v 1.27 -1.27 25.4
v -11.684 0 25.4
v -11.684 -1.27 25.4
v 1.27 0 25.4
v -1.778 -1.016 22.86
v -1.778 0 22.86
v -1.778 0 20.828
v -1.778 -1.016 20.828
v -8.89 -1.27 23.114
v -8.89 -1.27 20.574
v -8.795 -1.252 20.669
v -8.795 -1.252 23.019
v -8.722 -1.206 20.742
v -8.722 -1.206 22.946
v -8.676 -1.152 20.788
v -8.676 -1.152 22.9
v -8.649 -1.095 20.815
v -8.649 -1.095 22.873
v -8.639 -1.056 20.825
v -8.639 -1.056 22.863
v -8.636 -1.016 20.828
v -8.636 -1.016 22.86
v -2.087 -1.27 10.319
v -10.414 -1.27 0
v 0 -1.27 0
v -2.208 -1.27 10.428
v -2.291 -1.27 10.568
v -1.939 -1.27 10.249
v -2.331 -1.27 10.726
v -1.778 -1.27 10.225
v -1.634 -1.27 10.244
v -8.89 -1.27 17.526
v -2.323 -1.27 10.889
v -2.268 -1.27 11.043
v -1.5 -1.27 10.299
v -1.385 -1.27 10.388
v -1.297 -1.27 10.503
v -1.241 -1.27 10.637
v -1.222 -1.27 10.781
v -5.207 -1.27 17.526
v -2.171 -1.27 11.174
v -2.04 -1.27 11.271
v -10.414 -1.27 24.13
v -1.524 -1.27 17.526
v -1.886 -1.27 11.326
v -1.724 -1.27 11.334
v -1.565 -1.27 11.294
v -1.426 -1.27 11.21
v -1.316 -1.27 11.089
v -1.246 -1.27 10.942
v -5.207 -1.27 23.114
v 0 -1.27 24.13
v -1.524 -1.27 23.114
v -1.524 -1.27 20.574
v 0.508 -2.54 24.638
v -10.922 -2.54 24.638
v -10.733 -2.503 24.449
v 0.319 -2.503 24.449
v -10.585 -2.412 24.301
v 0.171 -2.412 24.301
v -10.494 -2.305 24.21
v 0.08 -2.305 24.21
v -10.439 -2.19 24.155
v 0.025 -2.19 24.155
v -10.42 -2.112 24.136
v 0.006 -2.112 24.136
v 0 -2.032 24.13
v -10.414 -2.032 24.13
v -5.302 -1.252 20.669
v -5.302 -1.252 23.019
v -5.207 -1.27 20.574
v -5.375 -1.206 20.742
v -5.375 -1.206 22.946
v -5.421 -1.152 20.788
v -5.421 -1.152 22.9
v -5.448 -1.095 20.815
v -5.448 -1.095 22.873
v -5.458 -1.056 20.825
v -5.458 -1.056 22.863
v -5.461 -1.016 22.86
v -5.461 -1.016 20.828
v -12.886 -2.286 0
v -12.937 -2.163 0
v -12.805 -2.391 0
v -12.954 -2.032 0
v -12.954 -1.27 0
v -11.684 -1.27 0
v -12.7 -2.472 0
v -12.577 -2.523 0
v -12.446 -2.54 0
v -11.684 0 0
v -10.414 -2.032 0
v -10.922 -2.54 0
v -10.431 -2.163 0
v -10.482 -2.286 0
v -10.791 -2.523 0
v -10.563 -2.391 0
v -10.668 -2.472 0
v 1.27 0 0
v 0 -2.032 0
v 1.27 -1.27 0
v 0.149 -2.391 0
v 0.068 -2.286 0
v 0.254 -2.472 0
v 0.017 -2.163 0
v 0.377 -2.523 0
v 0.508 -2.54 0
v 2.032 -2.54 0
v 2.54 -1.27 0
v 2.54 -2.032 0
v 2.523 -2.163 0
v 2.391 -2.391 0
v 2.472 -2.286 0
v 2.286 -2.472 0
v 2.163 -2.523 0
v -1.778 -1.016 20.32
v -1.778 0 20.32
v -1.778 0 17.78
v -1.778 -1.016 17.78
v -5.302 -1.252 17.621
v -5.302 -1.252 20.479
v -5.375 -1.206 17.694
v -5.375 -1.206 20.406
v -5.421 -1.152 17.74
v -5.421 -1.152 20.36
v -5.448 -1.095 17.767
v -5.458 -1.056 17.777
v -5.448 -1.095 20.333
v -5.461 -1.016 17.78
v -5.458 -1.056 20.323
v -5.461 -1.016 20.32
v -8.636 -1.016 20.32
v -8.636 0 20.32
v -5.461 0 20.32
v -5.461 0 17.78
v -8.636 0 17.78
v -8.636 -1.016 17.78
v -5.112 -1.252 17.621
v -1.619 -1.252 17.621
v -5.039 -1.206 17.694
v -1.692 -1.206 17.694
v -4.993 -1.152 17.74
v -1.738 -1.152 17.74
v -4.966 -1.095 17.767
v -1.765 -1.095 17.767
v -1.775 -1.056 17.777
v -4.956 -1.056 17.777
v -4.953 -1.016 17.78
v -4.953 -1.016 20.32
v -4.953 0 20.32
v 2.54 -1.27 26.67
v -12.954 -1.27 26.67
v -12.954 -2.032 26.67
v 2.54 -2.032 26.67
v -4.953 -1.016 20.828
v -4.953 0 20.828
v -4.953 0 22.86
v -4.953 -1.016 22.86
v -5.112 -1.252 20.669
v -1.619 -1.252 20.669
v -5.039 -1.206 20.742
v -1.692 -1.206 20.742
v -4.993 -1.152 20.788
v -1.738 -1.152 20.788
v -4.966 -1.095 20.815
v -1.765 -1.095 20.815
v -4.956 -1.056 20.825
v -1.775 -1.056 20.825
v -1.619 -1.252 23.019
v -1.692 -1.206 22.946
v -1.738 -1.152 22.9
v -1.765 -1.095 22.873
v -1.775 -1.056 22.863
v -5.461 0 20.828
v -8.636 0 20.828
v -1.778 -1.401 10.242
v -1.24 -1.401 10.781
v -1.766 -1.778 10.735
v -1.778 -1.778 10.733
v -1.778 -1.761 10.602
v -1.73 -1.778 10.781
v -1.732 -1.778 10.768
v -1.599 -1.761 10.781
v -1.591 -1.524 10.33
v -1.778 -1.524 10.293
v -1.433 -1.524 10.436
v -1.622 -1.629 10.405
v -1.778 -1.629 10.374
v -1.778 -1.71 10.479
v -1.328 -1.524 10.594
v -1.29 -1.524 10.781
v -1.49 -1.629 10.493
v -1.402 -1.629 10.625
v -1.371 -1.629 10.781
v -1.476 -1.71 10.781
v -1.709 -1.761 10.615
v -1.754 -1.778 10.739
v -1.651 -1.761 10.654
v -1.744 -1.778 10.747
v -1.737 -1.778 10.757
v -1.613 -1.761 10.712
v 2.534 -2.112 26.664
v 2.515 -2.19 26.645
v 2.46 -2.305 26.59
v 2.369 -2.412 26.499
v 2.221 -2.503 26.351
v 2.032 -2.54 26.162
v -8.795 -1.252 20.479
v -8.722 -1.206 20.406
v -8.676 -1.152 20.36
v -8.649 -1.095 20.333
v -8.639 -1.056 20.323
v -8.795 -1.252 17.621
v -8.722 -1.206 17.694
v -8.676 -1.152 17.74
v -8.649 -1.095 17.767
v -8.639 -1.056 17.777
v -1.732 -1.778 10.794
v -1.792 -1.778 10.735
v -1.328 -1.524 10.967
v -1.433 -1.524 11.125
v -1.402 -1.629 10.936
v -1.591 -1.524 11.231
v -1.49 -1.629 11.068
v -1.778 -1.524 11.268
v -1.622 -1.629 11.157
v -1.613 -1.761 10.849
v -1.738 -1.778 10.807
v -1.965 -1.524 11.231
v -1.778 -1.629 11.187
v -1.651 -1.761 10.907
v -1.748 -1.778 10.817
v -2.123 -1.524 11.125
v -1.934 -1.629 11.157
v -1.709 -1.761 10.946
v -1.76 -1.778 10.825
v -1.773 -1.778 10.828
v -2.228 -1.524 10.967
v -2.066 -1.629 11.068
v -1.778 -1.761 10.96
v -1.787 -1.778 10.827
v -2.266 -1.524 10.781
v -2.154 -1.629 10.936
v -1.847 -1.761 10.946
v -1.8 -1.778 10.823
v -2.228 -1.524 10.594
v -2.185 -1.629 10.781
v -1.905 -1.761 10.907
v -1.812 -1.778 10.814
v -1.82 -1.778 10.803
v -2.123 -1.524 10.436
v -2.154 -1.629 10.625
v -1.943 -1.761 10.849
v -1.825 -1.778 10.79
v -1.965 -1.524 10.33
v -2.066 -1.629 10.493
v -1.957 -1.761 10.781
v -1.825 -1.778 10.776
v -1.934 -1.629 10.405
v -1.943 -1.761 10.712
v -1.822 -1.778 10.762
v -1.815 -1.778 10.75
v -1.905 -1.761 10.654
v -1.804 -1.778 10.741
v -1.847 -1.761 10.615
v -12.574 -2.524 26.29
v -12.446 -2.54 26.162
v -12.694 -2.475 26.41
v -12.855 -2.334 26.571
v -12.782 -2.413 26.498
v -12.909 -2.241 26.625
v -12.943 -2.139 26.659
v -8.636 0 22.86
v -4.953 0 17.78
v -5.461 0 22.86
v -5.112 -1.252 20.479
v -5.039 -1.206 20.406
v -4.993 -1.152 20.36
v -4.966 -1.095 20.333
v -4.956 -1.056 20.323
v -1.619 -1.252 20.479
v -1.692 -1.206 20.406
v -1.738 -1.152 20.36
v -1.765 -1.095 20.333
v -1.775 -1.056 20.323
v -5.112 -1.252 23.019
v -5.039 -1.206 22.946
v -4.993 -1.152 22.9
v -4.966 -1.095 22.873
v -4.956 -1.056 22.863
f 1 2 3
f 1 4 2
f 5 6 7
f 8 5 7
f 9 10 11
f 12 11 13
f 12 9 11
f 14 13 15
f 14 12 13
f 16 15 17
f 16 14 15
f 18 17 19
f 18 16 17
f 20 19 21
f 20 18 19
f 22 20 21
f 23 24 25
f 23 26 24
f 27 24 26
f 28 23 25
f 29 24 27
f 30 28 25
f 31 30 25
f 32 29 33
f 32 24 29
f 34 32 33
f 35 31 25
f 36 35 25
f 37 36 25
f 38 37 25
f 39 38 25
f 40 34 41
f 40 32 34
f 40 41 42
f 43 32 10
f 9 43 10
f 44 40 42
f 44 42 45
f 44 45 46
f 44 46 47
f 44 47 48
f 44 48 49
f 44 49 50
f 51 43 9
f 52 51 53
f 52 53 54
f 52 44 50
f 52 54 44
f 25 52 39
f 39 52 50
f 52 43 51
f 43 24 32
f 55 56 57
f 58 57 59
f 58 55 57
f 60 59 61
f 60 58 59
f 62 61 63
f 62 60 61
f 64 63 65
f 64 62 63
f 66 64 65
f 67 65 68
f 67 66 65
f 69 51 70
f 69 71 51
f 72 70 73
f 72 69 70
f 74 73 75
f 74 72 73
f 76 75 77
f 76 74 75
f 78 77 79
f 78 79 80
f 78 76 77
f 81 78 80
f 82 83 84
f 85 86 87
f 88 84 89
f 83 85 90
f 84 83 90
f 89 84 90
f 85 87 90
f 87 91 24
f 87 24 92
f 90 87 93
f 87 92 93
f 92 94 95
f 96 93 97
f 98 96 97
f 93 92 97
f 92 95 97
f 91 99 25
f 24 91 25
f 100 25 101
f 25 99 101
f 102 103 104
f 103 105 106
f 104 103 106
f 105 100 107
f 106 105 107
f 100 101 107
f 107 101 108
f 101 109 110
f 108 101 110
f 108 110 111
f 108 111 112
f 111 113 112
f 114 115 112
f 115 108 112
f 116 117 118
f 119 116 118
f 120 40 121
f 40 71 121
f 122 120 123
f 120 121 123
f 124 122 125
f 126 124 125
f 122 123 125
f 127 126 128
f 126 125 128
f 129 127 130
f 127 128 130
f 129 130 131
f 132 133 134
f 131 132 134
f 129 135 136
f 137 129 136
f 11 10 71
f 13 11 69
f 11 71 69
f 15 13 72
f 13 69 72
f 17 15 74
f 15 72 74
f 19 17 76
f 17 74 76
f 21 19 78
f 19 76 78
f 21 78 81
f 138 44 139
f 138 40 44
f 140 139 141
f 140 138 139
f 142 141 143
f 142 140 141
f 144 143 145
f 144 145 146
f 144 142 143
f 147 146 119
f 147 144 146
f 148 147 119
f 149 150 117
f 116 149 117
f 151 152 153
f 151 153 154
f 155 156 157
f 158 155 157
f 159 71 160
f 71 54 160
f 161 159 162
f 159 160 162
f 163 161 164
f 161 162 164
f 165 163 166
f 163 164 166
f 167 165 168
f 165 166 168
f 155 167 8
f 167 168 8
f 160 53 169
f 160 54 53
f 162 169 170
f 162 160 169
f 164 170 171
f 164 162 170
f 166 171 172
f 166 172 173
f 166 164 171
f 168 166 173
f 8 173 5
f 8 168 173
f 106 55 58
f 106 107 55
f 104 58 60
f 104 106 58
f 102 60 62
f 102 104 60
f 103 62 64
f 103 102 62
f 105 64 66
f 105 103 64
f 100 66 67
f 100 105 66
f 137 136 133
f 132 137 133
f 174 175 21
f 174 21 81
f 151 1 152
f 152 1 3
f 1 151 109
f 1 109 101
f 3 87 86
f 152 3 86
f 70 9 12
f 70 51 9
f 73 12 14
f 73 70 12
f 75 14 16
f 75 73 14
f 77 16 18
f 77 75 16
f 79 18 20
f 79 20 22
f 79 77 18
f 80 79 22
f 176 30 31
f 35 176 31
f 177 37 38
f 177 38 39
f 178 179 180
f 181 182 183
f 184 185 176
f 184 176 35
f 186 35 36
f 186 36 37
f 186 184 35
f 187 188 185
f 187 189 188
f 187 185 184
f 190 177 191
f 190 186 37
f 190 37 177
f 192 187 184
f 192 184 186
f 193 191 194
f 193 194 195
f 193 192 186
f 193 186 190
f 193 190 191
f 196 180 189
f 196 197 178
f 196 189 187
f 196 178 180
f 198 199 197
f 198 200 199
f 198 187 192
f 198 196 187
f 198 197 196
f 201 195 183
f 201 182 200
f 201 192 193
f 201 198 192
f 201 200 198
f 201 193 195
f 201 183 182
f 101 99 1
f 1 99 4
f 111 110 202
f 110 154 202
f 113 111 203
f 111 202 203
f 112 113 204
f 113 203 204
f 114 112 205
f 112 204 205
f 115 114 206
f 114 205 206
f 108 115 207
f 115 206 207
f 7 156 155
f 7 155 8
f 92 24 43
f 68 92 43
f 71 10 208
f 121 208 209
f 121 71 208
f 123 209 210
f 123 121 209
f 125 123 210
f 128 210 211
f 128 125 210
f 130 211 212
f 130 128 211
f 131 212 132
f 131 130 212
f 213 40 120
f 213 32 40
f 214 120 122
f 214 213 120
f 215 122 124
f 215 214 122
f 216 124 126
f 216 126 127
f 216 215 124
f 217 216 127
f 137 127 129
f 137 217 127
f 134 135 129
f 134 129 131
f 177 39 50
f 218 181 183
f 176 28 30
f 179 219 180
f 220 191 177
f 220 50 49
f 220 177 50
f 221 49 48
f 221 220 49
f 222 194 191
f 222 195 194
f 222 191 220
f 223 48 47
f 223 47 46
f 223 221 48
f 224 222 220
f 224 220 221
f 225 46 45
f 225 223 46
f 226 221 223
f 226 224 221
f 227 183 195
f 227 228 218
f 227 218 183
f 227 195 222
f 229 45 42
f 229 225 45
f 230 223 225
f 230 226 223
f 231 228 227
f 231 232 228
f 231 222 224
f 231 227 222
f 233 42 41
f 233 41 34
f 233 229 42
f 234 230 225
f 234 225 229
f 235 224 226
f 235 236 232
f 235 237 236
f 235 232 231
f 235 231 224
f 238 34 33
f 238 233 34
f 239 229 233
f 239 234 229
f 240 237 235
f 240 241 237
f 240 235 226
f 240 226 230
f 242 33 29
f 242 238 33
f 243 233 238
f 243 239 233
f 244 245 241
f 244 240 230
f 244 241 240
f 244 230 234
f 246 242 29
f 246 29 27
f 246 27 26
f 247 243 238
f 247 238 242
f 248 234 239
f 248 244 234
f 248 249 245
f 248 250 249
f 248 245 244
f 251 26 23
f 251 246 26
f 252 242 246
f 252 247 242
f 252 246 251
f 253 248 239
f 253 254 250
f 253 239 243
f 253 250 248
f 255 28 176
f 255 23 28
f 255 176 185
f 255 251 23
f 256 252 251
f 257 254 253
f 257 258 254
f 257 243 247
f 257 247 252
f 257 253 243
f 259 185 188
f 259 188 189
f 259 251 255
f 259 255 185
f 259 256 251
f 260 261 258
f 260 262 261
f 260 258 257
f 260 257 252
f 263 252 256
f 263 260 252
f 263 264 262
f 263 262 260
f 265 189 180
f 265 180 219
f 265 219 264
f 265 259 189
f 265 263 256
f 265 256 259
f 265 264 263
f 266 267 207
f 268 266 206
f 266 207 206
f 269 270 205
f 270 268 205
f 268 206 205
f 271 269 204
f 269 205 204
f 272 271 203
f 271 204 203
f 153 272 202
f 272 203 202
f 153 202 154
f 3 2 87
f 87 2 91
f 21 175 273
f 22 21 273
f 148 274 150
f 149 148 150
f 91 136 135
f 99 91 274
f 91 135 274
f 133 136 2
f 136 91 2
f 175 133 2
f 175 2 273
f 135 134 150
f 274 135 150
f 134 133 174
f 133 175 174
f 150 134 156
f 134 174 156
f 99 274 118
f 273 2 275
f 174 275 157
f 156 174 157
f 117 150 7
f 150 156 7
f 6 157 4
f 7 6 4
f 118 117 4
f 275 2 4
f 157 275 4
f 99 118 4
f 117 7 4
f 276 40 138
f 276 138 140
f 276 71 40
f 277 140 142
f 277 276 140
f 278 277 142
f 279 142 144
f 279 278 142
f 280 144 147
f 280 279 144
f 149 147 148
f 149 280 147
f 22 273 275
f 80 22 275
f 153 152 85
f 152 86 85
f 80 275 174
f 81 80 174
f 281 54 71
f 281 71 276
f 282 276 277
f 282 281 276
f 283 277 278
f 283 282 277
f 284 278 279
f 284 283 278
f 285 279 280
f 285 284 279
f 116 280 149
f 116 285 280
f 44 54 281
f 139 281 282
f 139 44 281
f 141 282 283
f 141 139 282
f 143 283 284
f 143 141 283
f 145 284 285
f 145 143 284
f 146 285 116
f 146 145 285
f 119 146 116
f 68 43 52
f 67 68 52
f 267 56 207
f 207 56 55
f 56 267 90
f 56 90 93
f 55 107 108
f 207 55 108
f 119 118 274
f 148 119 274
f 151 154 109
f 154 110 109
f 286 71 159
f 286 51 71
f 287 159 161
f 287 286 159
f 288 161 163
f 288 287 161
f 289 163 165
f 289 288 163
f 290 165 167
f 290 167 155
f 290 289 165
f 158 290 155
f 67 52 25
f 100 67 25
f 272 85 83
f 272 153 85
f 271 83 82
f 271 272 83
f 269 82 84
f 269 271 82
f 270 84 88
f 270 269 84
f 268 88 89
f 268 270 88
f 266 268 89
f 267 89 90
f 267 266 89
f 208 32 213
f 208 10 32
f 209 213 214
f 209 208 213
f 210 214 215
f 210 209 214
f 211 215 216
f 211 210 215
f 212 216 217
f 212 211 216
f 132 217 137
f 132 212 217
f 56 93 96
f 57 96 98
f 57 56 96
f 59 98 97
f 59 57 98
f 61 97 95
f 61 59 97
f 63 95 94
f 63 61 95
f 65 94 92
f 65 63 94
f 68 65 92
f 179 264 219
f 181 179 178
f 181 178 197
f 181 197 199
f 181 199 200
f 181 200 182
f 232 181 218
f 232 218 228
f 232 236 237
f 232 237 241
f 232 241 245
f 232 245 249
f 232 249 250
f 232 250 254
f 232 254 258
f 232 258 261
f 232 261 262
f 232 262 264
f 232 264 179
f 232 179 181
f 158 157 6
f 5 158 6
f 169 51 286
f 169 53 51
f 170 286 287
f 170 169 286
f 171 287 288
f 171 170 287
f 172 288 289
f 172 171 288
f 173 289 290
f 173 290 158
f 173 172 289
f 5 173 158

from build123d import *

# Parameters (mm, degrees)
F1_DEPTH  = 2.54
F0_W      = 0.508
F0_H      = 0.508
F0_H_2    = 2.032
F0_W_2    = 3.175
F0_H_3    = 2.54
F2_DEPTH  = 1.27
F3_DEPTH  = 1.778
F4_R      = 0.50799
F5_R      = 0.25399
F6_W      = 1.27
F6_H      = 25.4
F7_DEPTH  = 1.27
F8_W      = 1.27
F8_H      = 25.4
F9_DEPTH  = 1.27
F11_DEPTH = 1.27
F12_R     = 0.508


# Not quite as in the source:
# - a fillet or chamfer is up to 0.001 mm smaller than in the source, because OpenCascade refuses the exact size


with BuildPart() as f1:
    # F0 (on Front) → F1 (new body)
    with BuildSketch(Plane.XZ):
        Polygon((0, 24.13), (0, 0), (1.27, 0), (1.27, 25.4), (-11.684, 25.4), (-11.684, 0), (-10.414, 0), (-10.414, 24.13), align=None)
    extrude(amount=F1_DEPTH)

    # F0 (on Front) → F2 (join)
    with BuildSketch(Plane.XZ):
        Polygon((-1.778, 0), (0, 0), (0, 24.13), (-10.414, 24.13), (-10.414, 0), align=None)
        with BuildLine():
            ThreePointArc((-1.2223680419, 10.7806390151), (-1.3851088746, 10.3877478897), (-1.778, 10.2250070571))
            ThreePointArc((-1.778, 10.2250070571), (-2.1708911254, 11.1735301405), (-1.2223680419, 10.7806390151))
        make_face(mode=Mode.SUBTRACT)
        Polygon((-4.953, 22.86), (-1.778, 22.86), (-1.778, 20.828), (-1.778, 20.32), (-1.778, 17.78), (-4.953, 17.78), (-5.461, 17.78), (-8.636, 17.78), (-8.636, 20.32), (-8.636, 20.828), (-8.636, 22.86), (-5.461, 22.86), align=None, mode=Mode.SUBTRACT)
        with Locations((-5.207, 20.574)):
            Rectangle(F0_W, F0_H)
        with Locations((-5.207, 21.844)):
            Rectangle(F0_W, F0_H_2)
        with Locations((-7.0485, 20.574)):
            Rectangle(F0_W_2, F0_H)
        with Locations((-5.207, 19.05)):
            Rectangle(F0_W, F0_H_3)
        with Locations((-3.3655, 20.574)):
            Rectangle(F0_W_2, F0_H)
        with BuildLine():
            ThreePointArc((-1.2223680419, 10.7806390151), (-2.1708911254, 11.1735301405), (-1.778, 10.2250070571))
            ThreePointArc((-1.778, 10.2250070571), (-1.3851088746, 10.3877478897), (-1.2223680419, 10.7806390151))
        make_face()
    extrude(amount=F2_DEPTH)

    # F0 (on Front) → F3 (join)
    with BuildSketch(Plane.XZ):
        with BuildLine():
            ThreePointArc((-1.2223680419, 10.7806390151), (-2.1708911254, 11.1735301405), (-1.778, 10.2250070571))
            ThreePointArc((-1.778, 10.2250070571), (-1.3851088746, 10.3877478897), (-1.2223680419, 10.7806390151))
        make_face()
    extrude(amount=F3_DEPTH)

    # F4 (radius 0.508 in the source; OpenCascade refuses exactly that, so slightly less here)
    f4_edges = [f1.edges().sort_by_distance(p)[0] for p in [
        (-10.414, -2.54, 12.065),
        (0, -2.54, 12.065),
        (-5.207, -2.54, 24.13),
        (-1.778, -1.778, 11.336271),
    ]]
    fillet(f4_edges, radius=F4_R)

    # F5 (radius 0.254 in the source; OpenCascade refuses exactly that, so slightly less here)
    f5_edges = [f1.edges().sort_by_distance(p)[0] for p in [
        (-3.3655, -1.27, 22.86),
        (-1.778, -1.27, 21.844),
        (-3.3655, -1.27, 20.828),
        (-1.778, -1.27, 19.05),
        (-3.3655, -1.27, 17.78),
        (-7.0485, -1.27, 17.78),
        (-5.461, -1.27, 19.05),
        (-7.0485, -1.27, 22.86),
        (-8.636, -1.27, 21.844),
        (-8.636, -1.27, 19.05),
        (-7.0485, -1.27, 20.32),
        (-4.953, -1.27, 21.844),
        (-7.0485, -1.27, 20.828),
        (-5.461, -1.27, 21.844),
        (-4.953, -1.27, 19.05),
        (-3.3655, -1.27, 20.32),
    ]]
    fillet(f5_edges, radius=F5_R)

    # F6 (on face) → F7 (join)
    with BuildSketch(Plane.YZ.offset(1.27)):
        with Locations((-1.905, 12.7)):
            Rectangle(F6_W, F6_H)
    extrude(amount=F7_DEPTH)

    # F8 (on face) → F9 (join)
    with BuildSketch(Plane(origin=(-11.684, 0, 0), x_dir=(0, -1, 0), z_dir=(-1, 0, 0))):
        with Locations((1.905, 12.7)):
            Rectangle(F8_W, F8_H)
    extrude(amount=F9_DEPTH)

    # F10 (on face) → F11 (join)
    with BuildSketch(Plane.XY.offset(25.4)):
        Polygon((-12.954, -1.27), (-12.954, -2.54), (2.54, -2.54), (2.54, -1.27), (1.27, -1.27), (-11.684, -1.27), align=None)
    extrude(amount=F11_DEPTH)

    # F12
    f12_edges = [f1.edges().sort_by_distance(p)[0] for p in [
        (-12.954, -2.54, 13.335),
        (-5.207, -2.54, 26.67),
        (2.54, -2.54, 13.335),
    ]]
    fillet(f12_edges, radius=F12_R)


solid = f1.part
